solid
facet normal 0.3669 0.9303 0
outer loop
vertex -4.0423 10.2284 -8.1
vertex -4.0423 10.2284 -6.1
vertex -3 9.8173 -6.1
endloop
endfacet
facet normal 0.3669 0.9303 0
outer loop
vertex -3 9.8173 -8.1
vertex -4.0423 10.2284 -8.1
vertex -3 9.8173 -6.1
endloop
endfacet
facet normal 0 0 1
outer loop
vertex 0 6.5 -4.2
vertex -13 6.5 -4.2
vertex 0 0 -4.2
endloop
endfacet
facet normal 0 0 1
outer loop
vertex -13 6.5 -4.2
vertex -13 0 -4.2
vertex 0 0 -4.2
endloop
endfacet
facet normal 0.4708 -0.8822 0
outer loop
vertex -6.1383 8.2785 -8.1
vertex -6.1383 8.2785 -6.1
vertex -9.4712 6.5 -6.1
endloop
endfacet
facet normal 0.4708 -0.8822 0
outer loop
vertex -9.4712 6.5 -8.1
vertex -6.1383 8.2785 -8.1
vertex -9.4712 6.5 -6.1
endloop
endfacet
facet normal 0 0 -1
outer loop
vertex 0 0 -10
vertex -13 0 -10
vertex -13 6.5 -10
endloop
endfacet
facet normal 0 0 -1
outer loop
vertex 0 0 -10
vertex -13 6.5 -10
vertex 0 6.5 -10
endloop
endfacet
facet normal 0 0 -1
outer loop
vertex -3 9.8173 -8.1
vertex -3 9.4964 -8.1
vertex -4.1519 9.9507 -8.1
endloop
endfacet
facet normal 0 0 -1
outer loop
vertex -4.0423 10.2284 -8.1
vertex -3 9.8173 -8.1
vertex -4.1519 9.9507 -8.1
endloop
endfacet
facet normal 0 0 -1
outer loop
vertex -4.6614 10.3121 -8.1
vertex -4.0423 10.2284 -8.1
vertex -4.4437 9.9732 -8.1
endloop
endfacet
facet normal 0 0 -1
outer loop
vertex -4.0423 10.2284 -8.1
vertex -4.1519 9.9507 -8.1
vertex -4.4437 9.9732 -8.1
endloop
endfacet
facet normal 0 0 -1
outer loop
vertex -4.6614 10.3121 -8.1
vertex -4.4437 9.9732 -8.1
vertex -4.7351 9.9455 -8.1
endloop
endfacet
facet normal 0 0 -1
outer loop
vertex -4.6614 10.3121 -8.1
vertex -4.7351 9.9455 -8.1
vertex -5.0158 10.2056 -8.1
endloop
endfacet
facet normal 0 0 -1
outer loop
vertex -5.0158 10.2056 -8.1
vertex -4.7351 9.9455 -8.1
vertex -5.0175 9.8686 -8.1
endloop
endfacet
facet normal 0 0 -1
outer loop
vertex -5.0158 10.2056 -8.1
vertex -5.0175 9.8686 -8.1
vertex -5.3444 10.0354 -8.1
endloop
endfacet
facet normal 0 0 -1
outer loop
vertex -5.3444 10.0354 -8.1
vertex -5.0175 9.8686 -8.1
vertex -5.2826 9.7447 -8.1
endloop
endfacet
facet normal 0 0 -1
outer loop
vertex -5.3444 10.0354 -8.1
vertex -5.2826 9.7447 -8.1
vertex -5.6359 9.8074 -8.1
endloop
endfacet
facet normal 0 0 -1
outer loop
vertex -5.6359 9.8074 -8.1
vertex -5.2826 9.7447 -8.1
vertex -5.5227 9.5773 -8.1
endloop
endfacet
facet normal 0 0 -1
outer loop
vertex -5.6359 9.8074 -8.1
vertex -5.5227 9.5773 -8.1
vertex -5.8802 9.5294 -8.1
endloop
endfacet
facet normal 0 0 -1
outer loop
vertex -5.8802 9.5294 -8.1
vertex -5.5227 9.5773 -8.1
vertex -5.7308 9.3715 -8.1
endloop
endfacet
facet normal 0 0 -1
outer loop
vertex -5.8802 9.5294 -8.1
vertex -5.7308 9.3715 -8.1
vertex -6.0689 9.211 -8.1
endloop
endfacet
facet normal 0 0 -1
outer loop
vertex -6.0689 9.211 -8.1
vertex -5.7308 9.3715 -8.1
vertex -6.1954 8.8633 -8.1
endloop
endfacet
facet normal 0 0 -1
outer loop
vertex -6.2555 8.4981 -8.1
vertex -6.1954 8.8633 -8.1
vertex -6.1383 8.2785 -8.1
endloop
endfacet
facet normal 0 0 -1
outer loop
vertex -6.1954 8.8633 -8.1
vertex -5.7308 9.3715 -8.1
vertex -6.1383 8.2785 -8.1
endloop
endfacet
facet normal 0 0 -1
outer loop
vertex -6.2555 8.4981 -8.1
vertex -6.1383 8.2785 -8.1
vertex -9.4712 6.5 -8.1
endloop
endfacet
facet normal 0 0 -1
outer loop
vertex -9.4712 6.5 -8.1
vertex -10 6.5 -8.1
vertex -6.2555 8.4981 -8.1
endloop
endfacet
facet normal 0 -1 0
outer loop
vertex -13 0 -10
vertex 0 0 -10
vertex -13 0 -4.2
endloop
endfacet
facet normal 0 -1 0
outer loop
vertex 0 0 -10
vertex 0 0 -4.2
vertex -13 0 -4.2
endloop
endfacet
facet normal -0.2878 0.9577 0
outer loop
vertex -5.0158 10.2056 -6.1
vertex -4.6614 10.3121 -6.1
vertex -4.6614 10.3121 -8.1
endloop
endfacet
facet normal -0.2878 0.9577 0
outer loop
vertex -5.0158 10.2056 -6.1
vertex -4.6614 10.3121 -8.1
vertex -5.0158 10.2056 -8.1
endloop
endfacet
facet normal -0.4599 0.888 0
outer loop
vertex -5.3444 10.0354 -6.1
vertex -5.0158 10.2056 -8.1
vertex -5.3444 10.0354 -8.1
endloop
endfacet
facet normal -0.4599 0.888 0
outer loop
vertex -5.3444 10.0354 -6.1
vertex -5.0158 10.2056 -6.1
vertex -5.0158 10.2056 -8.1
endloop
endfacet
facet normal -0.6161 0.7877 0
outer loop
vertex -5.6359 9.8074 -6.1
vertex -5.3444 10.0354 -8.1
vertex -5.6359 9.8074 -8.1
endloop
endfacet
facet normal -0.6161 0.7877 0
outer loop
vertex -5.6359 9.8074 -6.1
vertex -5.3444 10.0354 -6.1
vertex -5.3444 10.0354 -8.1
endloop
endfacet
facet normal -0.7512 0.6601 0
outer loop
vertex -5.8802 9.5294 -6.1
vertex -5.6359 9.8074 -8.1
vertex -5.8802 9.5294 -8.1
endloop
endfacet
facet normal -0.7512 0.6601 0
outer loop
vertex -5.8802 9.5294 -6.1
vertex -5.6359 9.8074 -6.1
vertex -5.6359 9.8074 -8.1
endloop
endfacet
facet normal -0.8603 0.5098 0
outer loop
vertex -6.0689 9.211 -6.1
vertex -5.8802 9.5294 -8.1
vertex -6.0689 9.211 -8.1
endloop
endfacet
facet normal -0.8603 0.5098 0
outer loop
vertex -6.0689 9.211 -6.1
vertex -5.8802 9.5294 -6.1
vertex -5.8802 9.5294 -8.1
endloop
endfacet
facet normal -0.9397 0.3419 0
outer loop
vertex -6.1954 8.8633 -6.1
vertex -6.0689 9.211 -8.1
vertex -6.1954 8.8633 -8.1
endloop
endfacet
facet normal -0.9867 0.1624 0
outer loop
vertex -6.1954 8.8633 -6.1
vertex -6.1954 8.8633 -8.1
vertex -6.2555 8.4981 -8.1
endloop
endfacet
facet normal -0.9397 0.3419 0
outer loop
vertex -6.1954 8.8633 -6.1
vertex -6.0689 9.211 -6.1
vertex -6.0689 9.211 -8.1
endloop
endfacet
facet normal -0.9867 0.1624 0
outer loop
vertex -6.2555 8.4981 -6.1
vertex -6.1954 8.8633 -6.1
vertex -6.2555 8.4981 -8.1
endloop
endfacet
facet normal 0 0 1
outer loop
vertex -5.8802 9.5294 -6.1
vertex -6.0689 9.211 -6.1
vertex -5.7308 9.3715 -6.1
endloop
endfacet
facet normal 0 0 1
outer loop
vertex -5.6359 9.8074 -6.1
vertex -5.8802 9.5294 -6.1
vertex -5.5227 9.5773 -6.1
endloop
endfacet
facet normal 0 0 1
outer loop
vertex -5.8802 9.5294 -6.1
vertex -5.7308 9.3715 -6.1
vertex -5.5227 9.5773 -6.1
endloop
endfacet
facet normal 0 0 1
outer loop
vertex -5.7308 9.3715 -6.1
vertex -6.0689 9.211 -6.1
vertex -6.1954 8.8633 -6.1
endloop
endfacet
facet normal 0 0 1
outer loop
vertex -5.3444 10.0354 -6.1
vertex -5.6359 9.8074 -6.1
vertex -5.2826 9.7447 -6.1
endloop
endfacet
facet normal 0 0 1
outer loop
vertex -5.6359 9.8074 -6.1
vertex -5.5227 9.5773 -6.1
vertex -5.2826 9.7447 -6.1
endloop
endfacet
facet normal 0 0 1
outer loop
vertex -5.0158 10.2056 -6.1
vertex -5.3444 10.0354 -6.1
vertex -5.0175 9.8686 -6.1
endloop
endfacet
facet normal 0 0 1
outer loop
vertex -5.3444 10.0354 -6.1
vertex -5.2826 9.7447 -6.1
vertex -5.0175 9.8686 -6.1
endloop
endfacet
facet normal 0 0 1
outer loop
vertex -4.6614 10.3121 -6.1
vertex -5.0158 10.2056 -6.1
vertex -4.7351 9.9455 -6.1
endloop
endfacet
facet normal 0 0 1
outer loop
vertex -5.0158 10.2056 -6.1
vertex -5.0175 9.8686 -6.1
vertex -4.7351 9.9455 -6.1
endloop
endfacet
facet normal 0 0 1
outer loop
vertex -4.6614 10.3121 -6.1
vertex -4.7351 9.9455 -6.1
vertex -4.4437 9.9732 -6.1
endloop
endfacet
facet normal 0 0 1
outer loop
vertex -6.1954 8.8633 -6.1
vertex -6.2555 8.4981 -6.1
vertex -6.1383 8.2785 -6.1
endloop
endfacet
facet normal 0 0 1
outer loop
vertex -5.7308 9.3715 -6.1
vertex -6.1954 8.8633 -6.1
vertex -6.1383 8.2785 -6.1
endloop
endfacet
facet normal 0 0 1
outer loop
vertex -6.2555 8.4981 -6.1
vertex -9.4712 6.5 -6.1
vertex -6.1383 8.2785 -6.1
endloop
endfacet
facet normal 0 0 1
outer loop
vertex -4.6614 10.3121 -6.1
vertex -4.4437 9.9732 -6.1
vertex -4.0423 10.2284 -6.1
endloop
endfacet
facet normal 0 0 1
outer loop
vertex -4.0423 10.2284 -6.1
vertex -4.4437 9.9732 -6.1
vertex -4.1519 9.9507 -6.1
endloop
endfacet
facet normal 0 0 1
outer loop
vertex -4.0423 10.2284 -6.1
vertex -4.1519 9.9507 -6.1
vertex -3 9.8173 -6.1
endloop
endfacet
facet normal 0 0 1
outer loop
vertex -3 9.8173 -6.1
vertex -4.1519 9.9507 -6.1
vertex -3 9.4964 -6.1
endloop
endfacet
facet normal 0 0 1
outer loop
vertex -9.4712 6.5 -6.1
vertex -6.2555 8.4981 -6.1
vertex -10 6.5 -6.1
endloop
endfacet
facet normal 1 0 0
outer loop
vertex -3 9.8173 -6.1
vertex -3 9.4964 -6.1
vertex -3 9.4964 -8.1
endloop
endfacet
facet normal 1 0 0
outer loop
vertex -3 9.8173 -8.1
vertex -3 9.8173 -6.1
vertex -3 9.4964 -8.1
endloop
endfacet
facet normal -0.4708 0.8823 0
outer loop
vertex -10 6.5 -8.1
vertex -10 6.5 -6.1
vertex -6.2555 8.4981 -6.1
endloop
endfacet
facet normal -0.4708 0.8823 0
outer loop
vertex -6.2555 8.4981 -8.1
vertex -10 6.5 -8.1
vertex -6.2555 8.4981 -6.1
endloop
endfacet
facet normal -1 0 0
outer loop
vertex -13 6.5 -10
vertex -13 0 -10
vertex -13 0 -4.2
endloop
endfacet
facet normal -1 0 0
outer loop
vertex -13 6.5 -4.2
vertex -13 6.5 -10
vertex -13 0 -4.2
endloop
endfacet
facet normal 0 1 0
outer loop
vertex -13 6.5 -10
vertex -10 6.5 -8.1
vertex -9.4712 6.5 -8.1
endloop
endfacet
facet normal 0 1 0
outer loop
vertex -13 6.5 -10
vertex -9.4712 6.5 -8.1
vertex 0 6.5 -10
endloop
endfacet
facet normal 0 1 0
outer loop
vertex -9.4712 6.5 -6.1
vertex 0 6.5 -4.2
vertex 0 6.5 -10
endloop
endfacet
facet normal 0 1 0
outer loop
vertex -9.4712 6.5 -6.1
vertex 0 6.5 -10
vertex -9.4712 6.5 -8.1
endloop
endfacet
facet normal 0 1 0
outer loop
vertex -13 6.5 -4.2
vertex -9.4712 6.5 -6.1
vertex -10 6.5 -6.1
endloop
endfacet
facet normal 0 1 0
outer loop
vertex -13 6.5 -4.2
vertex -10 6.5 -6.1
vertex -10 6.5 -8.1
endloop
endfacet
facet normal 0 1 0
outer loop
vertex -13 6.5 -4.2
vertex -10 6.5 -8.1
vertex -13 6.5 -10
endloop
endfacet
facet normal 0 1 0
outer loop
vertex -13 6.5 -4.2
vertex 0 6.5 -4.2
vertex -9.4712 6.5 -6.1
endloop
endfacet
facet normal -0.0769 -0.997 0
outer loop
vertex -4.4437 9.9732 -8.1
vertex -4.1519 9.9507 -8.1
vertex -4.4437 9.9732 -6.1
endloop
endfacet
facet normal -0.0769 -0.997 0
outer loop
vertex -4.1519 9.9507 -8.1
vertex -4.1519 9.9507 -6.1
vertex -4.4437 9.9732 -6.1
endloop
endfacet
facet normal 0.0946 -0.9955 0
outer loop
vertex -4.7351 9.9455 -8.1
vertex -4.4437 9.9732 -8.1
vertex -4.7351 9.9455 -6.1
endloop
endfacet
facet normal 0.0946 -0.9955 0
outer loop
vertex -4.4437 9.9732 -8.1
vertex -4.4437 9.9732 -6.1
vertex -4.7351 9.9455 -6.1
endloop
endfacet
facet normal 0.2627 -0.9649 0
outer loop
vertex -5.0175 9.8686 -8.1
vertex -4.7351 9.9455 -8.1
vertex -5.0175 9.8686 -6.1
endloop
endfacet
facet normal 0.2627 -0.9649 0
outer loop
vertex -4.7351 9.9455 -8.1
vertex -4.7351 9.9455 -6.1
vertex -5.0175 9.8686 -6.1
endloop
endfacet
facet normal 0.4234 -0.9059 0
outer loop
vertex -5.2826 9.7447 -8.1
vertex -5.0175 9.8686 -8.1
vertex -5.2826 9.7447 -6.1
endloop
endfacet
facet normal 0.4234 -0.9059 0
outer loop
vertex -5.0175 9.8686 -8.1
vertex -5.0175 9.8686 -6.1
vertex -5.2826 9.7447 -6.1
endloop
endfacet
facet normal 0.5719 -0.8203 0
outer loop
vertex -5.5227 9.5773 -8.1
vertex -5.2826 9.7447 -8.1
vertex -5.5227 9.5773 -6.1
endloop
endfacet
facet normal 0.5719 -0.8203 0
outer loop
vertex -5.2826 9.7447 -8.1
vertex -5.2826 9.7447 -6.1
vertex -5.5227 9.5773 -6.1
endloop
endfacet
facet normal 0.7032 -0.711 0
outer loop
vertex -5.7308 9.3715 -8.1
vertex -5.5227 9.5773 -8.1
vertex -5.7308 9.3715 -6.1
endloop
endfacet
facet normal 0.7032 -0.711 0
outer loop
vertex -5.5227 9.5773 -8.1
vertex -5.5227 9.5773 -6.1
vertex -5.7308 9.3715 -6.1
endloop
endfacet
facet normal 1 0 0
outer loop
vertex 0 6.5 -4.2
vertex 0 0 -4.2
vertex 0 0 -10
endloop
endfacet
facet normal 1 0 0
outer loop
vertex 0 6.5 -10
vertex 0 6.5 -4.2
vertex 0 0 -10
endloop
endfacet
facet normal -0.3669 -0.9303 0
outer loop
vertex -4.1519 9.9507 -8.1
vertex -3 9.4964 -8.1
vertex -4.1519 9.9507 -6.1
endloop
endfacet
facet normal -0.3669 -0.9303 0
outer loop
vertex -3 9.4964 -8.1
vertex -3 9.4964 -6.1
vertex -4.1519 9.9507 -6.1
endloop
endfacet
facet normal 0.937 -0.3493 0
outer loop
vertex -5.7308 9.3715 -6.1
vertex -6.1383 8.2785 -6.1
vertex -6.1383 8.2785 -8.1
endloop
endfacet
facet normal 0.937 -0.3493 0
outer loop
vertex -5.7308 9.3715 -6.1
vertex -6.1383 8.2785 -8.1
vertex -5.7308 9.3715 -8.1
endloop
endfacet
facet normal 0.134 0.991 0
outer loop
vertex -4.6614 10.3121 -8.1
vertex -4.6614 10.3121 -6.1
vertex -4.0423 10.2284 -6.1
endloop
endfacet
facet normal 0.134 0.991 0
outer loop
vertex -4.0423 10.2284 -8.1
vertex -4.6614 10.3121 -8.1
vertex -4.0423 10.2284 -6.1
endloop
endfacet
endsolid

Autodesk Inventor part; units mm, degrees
ref_plane "YZ Plane" through (0, 0, 0) normal (1, 0, 0) x (0, 1, 0)
ref_plane "XZ Plane" through (0, 0, 0) normal (0, 1, 0) x (-1, 0, 0)
ref_plane "XY Plane" through (0, 0, 0) normal (0, 0, 1) x (1, 0, 0)
sketch "Sketch1" plane through (0, 0, 0) normal (0, 1, 0) x (-1, 0, 0)
  line L0 (13, -10) -> (0, -10)
  line L1 (0, -10) -> (13, -10)
  line L2 (13, -10) -> (13, -4.2)
  line L3 (13, -4.2) -> (0, -4.2)
  line L4 (0, -4.2) -> (0, -10)
  dimension "d0" = 13
  dimension "d4" = 5.8
extrude "Extrusion1" add sketch "Sketch1" along normal blind 6.5
sketch "Sketch2" plane through (0, 6.5, 0) normal (0, 1, 0) x (1, 0, 0)
  line L0 (0, 4.2) -> (0, 10) projected
  line L1 (0, 0) -> (0, 4.2)
  line L2 (0, 4.2) -> (0, 10)
  line L3 (0, 4.2) -> (0, 10) projected
  line L4 (0, 7.1) -> (-3, 7.1)
  line L5 (-3, 7.1) -> (-3, 8.1)
  line L6 (-3, 8.1) -> (-3, 6.1)
  line L7 (-3, 8.1) -> (-10, 8.1)
  line L8 (-10, 8.1) -> (-10, 6.1)
  line L9 (-10, 6.1) -> (-3, 6.1)
  line L10 (-3, 6.1) -> (-3, 8.1)
  dimension "d5" = 3
  dimension "d6" = 1
  dimension "d7" = 2
  dimension "d8" = 7
extrude "Extrusion2" add sketch "Sketch2" along normal blind 6
sketch "Sketch3" plane through (-10, 6.5, -6.1) normal (0, 0, 1) x (1, 0, 0)
  line L0 (7, 0) -> (0, 0) projected
  line L1 (0, 0) -> (3.7445, 1.9981)
  line L2 (3.7445, 1.9981) -> (3.8617, 1.7785)
  line L3 (3.8617, 1.7785) -> (0.5288, 0)
  arc A0 (5.3386, 3.8121) -> (3.7445, 1.9981) centre (5.7324, 1.8586) ccw
  arc A1 (5.8481, 3.4507) -> (4.2692, 2.8715) centre (5.5714, 1.7635) ccw
  line L4 (5.9577, 3.7284) -> (7.4262, 3.1492)
  line L5 (7.4262, 3.1492) -> (7.3166, 2.8715)
  line L6 (7.3166, 2.8715) -> (5.8481, 3.4507)
  line L7 (5.3386, 3.8121) -> (5.9577, 3.7284)
  line L8 (3.8617, 1.7785) -> (4.2692, 2.8715)
  line L9 (0.5288, 0) -> (0, 0)
  line L10 (7, 6) -> (0, 6) projected
  line L11 (0, 6) -> (7, 6)
  line L12 (7, 6) -> (7, 0)
  line L13 (7, 0) -> (0, 0)
  line L14 (0, 0) -> (0, 6)
  point P0 (10, -6.5)
  point P1 (7, 2.9964)
  point P2 (7, 3.3173)
extrude "Extrusion3" cut sketch "Sketch3" against normal blind 6 contours L0 L3 L8 A1 L6 L12 | L14 L10 L12 L4 L7 A0 L1
properties part number "WK330"
